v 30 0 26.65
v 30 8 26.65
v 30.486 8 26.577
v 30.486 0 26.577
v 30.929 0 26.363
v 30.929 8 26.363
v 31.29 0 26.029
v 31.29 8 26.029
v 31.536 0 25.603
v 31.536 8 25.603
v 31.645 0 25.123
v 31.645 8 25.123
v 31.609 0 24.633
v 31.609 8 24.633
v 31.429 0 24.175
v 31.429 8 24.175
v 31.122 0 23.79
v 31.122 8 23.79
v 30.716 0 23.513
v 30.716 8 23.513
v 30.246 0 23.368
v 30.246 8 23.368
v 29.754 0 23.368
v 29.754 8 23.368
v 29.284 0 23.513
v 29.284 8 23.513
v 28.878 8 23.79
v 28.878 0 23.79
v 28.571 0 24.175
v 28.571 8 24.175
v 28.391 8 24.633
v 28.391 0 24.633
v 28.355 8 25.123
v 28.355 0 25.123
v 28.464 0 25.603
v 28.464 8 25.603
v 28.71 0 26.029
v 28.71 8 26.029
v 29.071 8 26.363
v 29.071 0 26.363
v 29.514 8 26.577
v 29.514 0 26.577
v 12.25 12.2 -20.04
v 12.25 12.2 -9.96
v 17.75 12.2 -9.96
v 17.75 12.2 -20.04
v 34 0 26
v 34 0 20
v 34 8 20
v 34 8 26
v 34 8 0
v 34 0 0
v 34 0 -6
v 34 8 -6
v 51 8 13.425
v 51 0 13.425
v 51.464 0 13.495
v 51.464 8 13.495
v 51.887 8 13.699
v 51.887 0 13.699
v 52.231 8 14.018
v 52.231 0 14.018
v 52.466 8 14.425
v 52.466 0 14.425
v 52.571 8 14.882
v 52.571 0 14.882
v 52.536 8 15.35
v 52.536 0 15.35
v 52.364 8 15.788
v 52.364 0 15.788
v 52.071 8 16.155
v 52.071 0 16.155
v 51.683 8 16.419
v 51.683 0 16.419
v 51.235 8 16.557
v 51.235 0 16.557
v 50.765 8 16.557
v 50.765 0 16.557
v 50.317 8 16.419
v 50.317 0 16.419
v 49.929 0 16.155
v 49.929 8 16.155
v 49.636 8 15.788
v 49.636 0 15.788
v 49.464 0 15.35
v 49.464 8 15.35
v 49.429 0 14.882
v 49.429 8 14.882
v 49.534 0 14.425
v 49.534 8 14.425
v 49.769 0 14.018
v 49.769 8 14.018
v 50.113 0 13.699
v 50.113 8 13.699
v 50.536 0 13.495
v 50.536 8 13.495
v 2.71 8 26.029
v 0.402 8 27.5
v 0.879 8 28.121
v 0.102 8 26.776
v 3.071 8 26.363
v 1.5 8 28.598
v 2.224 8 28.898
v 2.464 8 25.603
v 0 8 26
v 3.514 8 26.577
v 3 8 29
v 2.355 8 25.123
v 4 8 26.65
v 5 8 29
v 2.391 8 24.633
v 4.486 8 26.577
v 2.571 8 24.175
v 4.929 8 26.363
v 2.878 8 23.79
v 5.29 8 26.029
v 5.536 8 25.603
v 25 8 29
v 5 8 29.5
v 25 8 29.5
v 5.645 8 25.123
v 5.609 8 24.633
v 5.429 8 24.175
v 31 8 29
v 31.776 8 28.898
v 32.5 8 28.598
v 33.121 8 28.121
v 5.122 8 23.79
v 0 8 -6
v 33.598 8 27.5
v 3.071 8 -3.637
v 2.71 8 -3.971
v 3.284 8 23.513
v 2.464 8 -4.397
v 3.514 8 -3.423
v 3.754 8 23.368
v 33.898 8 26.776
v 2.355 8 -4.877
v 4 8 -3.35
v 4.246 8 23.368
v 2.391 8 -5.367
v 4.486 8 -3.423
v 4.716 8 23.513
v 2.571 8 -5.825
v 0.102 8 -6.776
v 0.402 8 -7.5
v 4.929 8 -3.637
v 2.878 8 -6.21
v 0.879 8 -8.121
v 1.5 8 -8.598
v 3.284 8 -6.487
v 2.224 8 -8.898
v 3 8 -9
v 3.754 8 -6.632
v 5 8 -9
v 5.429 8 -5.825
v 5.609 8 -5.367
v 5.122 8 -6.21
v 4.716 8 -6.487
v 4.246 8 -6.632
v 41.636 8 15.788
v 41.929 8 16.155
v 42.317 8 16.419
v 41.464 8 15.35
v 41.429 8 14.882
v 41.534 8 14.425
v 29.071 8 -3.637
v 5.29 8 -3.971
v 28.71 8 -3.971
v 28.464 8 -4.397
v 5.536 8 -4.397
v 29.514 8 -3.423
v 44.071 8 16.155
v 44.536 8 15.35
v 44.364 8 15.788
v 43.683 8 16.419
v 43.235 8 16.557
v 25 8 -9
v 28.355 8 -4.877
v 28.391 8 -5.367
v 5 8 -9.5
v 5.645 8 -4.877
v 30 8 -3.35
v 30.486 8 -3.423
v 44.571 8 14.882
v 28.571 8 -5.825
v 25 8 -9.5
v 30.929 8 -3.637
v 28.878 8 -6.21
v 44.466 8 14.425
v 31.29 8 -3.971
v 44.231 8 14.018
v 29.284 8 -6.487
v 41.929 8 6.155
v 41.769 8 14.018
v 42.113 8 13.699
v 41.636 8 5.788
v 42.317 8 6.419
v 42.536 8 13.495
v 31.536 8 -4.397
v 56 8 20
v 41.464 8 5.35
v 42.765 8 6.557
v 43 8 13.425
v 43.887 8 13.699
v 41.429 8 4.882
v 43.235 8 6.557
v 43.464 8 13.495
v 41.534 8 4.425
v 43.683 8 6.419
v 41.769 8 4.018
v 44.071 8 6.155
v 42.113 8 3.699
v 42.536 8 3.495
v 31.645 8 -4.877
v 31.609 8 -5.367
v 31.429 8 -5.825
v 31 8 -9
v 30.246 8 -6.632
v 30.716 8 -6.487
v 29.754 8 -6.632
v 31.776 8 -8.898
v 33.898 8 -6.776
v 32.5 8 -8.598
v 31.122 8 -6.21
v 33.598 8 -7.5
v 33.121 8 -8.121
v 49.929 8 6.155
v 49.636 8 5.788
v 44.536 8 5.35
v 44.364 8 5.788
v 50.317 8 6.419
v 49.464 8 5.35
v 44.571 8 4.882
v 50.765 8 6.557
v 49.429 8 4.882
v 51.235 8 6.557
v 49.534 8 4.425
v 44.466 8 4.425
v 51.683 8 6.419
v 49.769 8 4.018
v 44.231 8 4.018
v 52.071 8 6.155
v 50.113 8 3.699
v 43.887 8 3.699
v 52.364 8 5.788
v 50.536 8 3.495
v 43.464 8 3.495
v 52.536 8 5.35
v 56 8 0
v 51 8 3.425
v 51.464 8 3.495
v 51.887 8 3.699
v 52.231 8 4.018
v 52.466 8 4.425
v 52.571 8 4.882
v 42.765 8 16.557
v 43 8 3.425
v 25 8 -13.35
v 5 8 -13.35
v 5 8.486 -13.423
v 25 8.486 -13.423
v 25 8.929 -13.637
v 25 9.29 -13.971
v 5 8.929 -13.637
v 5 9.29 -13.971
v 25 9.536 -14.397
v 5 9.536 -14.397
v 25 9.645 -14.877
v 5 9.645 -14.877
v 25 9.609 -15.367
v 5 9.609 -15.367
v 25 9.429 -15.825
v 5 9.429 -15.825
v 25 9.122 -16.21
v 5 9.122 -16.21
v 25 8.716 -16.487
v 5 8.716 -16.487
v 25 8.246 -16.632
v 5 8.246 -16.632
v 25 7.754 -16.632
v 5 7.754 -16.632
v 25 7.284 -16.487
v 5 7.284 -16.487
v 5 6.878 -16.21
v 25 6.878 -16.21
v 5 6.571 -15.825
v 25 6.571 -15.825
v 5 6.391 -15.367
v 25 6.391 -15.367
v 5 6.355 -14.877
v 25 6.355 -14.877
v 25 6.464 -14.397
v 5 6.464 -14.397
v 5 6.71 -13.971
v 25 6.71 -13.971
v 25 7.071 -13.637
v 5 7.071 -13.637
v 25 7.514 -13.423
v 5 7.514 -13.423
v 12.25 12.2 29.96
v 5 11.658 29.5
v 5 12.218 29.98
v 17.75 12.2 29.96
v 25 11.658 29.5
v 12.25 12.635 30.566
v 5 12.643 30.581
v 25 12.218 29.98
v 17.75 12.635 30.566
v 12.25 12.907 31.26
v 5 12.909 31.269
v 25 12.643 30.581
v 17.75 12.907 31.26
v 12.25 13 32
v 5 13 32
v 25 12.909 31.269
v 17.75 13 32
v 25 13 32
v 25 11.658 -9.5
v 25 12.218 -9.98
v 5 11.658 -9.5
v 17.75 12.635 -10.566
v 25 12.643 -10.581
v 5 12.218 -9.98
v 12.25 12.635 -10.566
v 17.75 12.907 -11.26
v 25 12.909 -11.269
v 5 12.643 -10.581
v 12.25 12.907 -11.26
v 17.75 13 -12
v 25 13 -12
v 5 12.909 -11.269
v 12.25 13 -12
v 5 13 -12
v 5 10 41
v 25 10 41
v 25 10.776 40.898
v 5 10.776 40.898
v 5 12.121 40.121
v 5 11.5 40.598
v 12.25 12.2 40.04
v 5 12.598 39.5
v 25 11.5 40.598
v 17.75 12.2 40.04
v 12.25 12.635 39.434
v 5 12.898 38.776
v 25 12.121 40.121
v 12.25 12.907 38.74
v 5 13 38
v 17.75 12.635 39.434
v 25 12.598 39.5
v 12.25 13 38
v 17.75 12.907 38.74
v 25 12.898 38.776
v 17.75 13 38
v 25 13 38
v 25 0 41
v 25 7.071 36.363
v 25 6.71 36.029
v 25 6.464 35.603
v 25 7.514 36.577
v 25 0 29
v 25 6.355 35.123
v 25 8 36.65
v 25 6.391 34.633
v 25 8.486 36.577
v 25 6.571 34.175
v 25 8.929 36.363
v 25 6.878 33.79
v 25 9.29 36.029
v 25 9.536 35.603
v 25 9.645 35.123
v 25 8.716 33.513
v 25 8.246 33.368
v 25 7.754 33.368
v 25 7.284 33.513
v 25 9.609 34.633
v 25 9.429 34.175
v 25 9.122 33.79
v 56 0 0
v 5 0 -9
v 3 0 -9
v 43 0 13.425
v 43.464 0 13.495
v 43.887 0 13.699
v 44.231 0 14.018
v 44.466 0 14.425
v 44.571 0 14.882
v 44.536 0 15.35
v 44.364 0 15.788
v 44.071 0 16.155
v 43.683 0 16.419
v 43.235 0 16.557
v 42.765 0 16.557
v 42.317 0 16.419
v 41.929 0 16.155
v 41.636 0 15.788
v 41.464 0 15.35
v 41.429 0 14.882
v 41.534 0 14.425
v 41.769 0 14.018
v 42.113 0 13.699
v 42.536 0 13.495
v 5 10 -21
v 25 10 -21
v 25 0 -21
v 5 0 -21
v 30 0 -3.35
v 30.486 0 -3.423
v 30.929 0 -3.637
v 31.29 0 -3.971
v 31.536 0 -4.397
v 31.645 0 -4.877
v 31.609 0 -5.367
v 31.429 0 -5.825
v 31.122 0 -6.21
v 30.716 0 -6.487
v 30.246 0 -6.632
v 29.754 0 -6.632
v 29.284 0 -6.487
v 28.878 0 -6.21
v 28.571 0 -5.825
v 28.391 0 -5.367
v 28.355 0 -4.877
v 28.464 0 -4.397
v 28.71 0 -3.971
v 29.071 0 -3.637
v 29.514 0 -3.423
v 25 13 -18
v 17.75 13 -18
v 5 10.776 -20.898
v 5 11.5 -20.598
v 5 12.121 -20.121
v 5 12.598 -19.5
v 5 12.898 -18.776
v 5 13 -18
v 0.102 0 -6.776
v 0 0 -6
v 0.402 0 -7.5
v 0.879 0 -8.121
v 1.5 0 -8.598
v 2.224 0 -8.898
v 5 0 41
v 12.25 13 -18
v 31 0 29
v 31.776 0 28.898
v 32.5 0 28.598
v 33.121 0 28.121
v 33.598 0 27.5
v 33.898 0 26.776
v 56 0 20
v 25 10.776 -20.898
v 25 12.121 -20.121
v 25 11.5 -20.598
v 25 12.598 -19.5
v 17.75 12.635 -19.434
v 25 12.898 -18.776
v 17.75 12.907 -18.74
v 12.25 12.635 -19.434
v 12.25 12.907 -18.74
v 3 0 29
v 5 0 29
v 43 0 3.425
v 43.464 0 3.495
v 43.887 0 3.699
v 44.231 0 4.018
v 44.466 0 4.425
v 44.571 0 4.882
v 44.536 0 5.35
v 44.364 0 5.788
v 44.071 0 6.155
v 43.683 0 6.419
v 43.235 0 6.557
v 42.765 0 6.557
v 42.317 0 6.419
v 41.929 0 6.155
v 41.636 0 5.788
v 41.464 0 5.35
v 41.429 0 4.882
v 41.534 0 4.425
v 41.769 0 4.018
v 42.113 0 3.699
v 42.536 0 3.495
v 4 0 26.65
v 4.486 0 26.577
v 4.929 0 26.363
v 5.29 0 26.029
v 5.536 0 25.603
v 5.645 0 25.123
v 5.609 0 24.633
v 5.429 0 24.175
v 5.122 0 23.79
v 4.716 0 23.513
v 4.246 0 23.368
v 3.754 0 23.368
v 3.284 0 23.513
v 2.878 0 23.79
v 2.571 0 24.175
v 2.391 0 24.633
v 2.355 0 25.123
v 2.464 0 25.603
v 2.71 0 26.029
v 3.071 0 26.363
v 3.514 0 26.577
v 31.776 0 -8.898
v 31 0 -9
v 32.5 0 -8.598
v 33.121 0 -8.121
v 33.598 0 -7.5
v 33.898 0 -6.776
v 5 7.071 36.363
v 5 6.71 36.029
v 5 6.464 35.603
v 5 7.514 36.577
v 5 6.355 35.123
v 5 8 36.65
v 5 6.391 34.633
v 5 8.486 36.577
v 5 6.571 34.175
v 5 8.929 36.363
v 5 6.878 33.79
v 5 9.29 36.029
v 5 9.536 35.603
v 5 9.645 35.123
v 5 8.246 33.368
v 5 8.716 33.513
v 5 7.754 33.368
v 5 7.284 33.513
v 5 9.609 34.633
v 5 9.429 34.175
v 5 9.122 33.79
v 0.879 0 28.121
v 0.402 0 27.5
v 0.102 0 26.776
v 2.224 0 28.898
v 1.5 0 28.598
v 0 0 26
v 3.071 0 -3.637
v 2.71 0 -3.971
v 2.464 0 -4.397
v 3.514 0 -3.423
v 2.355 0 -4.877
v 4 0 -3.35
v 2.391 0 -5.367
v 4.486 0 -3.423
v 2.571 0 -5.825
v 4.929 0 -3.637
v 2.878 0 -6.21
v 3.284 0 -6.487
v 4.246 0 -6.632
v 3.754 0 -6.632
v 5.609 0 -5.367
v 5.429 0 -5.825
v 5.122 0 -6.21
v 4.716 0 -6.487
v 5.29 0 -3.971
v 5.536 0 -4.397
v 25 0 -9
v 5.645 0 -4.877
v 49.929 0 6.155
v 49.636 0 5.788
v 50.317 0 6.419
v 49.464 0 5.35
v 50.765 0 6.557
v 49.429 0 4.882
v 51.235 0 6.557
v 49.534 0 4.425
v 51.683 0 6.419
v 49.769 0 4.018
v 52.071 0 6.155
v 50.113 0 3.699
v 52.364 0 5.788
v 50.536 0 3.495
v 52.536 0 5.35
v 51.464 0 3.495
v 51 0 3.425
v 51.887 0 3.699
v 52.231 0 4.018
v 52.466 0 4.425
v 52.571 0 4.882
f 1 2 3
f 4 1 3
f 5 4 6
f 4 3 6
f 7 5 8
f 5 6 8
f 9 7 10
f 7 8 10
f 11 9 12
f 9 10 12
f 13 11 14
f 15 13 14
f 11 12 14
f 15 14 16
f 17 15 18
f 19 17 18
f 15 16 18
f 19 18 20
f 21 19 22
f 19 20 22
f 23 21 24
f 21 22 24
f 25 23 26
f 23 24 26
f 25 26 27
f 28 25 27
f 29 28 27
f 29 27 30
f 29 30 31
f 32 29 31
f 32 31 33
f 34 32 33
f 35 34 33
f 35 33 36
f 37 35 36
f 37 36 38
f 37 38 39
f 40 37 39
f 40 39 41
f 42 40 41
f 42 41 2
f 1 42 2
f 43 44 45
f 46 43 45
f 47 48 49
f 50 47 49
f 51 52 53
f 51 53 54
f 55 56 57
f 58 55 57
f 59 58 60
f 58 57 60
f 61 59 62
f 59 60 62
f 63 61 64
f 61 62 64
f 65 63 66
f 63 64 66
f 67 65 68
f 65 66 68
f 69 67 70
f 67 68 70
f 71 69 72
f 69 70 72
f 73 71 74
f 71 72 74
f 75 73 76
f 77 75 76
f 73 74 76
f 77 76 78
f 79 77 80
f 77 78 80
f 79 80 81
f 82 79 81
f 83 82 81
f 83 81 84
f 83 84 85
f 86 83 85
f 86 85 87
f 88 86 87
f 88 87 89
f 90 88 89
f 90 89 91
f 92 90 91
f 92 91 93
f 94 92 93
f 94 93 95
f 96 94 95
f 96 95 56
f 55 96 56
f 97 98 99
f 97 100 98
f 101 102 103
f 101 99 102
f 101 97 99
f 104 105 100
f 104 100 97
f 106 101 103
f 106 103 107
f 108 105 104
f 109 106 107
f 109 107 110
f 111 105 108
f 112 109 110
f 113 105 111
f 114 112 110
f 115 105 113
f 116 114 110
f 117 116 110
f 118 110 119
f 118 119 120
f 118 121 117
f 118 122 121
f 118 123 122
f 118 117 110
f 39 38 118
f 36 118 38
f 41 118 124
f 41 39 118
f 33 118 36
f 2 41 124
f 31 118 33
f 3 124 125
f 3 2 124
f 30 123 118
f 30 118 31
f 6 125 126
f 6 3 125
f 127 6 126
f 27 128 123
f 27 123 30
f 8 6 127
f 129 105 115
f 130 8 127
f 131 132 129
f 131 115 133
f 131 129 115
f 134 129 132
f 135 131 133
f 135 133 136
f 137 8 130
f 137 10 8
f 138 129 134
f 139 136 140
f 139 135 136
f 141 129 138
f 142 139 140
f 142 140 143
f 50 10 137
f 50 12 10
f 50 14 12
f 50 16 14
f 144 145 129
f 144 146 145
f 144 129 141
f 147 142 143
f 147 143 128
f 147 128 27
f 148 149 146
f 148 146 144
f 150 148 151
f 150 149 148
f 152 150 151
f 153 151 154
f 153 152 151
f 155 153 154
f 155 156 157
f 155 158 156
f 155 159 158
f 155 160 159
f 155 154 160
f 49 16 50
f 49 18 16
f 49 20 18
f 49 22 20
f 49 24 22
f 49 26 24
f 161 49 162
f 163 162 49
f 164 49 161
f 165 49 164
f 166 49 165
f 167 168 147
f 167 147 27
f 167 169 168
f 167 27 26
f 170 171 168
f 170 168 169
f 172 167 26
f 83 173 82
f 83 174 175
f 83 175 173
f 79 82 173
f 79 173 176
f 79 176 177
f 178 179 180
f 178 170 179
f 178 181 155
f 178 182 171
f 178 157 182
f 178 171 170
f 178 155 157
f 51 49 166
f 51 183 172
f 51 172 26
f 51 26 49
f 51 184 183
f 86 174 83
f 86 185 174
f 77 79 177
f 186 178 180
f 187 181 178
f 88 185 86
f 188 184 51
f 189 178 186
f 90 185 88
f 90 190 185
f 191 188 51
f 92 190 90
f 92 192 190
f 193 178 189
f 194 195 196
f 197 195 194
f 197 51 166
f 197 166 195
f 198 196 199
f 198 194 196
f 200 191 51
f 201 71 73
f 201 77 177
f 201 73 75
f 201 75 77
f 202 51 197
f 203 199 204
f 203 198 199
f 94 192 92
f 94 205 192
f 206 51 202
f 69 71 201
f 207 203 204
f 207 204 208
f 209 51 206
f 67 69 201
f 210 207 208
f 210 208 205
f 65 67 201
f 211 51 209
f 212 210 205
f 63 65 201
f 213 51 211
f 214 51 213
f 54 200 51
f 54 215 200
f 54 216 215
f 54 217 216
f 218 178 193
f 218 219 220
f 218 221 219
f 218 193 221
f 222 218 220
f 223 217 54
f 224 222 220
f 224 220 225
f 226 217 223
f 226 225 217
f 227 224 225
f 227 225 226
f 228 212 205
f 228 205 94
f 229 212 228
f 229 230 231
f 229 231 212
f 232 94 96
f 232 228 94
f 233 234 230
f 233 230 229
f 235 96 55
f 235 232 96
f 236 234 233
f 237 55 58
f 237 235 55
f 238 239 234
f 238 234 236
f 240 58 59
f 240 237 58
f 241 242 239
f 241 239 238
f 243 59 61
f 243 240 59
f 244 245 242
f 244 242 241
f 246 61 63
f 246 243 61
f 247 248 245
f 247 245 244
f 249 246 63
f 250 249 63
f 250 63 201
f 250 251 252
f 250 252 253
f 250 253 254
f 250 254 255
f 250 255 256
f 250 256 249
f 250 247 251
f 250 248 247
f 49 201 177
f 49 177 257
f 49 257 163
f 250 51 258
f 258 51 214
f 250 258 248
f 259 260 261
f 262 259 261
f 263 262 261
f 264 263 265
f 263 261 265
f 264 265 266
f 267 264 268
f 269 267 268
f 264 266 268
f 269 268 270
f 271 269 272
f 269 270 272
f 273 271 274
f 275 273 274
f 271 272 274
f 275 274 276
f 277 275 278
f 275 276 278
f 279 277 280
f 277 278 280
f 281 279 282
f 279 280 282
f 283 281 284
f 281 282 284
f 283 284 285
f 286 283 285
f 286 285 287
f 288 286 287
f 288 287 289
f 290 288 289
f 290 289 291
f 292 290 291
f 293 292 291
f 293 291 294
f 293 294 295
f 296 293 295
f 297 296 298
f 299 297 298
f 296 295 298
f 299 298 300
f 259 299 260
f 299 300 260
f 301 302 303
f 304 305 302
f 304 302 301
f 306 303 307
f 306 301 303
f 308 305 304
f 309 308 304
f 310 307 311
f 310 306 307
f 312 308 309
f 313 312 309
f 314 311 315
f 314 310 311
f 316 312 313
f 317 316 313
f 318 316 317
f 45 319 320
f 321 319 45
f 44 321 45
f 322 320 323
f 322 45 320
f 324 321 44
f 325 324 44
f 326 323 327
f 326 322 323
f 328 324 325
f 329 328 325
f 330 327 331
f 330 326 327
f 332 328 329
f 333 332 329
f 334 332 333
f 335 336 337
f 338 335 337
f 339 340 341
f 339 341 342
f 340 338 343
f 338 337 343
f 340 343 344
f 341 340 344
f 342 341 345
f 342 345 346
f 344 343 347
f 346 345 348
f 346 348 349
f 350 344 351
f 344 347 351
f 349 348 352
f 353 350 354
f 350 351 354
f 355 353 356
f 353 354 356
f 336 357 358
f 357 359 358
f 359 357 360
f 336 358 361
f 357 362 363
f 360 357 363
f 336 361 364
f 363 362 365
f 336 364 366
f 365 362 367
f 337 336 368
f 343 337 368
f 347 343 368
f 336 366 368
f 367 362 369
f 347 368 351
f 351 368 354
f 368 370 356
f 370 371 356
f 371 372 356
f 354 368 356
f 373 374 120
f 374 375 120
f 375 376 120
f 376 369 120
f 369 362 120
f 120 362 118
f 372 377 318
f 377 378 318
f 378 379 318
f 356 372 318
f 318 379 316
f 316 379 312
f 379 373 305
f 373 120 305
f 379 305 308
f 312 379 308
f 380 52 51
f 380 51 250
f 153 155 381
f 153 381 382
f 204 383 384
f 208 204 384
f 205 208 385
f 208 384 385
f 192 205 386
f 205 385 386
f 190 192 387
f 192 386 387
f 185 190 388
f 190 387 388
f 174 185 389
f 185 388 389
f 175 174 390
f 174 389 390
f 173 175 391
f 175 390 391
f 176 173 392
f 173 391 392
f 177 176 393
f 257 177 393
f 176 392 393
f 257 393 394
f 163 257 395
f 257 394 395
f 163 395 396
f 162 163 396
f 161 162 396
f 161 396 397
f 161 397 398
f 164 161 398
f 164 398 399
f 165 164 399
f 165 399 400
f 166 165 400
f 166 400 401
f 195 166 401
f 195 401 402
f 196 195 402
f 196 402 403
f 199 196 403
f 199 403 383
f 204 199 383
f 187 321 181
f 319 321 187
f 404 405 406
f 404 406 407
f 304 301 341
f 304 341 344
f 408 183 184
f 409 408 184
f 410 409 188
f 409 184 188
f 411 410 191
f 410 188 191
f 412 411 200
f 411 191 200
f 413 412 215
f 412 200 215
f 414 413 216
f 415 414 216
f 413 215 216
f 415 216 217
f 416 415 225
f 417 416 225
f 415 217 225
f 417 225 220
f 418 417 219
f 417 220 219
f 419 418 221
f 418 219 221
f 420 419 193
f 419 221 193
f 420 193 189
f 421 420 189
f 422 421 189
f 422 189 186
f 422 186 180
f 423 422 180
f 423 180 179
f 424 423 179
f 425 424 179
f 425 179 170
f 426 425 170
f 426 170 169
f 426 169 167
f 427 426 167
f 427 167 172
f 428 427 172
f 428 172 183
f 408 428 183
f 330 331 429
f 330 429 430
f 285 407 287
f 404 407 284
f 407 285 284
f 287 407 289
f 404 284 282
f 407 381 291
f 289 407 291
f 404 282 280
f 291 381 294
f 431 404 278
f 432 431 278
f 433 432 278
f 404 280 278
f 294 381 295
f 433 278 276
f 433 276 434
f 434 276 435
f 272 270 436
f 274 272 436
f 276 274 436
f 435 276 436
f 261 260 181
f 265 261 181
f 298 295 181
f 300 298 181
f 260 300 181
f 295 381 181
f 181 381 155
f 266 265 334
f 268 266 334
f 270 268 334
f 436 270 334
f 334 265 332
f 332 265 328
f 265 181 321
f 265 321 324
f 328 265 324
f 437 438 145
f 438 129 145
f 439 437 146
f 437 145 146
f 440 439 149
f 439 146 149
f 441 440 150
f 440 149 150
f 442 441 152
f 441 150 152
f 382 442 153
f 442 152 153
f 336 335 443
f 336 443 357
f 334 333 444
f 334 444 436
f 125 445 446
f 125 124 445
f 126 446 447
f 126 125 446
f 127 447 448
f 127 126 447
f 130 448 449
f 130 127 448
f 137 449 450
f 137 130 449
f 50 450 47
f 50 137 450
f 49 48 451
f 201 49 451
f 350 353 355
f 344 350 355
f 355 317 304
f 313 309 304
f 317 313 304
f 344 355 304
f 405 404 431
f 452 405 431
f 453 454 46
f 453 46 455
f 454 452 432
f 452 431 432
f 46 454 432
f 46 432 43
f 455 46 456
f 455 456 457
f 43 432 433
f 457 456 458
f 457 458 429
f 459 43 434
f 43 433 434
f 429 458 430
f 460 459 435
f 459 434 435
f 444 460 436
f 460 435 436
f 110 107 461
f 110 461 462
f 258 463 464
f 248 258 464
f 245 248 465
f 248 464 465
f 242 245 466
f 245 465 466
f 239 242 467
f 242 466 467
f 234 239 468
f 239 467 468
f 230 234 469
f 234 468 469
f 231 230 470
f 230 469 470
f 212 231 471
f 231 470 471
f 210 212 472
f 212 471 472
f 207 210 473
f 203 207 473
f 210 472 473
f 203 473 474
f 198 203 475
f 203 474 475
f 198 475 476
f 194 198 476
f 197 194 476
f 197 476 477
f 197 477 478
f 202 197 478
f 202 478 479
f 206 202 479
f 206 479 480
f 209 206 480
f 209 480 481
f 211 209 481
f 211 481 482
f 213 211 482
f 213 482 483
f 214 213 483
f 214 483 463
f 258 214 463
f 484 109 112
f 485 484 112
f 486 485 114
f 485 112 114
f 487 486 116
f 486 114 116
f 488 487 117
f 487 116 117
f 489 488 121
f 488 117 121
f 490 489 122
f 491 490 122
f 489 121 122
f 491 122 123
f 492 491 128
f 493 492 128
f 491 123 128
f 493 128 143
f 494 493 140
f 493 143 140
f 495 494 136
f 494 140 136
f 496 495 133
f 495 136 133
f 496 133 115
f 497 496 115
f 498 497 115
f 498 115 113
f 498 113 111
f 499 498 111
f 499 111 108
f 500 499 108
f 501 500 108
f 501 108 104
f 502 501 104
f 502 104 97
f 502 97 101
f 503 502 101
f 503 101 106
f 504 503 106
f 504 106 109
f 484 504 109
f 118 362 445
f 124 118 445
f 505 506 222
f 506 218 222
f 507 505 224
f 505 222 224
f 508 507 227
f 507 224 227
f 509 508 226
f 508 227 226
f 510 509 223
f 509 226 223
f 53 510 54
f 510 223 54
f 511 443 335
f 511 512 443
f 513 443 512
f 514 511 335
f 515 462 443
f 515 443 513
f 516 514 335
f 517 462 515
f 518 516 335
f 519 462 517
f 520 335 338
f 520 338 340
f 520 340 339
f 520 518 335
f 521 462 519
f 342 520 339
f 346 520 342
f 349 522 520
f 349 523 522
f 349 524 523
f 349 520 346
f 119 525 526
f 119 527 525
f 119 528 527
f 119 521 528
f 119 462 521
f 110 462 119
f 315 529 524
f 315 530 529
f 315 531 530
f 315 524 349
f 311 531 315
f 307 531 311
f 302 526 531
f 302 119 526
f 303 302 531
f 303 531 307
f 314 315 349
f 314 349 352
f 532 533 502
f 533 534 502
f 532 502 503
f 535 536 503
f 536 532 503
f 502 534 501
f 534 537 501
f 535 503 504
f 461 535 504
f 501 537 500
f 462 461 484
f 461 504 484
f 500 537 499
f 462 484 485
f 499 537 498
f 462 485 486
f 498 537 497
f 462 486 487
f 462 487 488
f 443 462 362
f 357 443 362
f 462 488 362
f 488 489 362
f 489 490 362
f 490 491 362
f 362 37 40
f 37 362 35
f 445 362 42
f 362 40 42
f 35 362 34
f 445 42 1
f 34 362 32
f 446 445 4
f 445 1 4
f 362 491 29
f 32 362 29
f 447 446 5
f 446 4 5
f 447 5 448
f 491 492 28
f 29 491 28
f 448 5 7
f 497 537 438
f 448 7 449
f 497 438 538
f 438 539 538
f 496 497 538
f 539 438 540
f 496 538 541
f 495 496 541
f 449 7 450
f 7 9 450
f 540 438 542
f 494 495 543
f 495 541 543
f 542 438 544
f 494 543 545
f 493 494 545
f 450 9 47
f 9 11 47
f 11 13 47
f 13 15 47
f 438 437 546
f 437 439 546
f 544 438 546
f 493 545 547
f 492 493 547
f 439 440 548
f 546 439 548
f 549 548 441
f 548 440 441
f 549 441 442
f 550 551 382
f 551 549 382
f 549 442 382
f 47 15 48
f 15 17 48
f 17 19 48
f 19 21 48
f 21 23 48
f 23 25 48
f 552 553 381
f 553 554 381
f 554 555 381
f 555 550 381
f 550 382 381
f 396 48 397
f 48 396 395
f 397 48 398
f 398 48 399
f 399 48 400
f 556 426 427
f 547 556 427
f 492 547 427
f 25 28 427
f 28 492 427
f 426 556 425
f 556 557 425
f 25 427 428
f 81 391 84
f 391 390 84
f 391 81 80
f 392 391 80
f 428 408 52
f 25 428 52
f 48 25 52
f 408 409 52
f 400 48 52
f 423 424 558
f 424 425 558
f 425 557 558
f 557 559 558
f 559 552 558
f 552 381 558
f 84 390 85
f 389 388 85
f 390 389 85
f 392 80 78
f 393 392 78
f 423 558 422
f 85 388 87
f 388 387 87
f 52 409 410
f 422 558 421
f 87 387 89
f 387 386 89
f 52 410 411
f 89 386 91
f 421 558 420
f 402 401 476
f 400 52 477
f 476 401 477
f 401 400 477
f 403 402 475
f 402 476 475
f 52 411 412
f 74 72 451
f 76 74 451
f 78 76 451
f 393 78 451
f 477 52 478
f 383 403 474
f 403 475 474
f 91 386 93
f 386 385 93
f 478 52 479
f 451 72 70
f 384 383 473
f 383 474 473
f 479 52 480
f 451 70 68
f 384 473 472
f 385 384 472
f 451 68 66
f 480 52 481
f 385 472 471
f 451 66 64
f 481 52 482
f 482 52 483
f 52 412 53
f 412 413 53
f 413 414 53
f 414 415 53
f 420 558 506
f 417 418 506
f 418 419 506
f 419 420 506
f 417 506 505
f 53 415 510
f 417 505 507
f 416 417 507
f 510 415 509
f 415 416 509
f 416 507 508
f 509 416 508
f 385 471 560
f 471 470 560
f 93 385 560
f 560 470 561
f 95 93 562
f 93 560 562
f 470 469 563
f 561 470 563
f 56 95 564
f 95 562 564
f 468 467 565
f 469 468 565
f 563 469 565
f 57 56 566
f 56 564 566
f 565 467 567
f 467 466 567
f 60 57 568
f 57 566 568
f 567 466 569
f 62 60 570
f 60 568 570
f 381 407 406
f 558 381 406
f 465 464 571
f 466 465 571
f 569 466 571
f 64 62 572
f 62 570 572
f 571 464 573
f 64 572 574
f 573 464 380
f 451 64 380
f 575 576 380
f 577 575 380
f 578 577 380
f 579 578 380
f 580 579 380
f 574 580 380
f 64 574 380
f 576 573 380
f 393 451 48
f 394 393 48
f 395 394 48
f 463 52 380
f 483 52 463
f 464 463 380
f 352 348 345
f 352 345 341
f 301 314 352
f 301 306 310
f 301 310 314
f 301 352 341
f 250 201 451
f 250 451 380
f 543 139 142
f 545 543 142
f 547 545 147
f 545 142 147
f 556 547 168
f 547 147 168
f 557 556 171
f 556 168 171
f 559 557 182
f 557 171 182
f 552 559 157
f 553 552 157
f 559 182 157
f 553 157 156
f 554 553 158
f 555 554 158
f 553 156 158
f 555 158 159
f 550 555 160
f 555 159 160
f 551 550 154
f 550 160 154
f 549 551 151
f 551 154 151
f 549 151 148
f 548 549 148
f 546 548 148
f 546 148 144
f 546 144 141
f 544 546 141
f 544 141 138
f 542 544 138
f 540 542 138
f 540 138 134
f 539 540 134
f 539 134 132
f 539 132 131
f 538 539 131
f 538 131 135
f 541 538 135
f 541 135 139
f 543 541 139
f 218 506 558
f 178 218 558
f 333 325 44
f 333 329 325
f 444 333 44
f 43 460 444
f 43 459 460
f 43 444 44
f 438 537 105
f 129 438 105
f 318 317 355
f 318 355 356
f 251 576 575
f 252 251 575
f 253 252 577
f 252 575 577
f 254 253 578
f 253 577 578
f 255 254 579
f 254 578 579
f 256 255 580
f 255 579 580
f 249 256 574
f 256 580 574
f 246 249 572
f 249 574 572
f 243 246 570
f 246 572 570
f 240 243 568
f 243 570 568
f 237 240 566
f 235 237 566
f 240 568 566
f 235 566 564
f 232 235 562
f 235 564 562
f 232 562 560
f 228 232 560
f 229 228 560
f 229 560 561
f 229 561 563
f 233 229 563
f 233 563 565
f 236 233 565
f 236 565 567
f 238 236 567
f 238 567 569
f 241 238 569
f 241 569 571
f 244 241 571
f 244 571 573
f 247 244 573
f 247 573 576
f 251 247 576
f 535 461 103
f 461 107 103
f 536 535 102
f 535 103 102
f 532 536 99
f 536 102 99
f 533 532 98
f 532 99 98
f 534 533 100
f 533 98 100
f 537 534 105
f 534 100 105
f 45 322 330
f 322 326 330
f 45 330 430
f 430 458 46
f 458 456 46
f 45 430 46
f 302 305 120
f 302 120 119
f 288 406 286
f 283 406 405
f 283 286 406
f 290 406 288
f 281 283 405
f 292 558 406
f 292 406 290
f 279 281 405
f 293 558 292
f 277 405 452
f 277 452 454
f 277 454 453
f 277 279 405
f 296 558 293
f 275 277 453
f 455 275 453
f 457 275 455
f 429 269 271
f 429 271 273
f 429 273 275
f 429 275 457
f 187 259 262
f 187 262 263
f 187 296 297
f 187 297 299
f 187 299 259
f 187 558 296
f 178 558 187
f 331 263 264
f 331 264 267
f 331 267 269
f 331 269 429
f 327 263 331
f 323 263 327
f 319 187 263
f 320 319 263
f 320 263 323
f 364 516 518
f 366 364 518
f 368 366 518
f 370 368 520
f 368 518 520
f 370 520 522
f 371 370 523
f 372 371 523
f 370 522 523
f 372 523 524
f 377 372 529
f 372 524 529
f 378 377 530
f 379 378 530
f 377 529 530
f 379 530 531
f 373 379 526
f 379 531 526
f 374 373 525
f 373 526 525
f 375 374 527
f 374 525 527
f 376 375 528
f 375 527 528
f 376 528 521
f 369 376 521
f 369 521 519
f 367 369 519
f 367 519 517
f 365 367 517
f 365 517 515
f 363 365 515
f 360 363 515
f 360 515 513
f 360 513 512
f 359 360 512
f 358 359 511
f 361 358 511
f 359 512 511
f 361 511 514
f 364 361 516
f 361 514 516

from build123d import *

# Parameters (mm, degrees)
SKETCH1_W            = 300
SKETCH1_H            = 20
BOSS_EXTRUDE1_DEPTH  = 8
SKETCH2_W            = 34
SKETCH2_H            = 8
BOSS_EXTRUDE2_DEPTH  = 9
SKETCH3_W            = 34
SKETCH3_H            = 8
BOSS_EXTRUDE3_DEPTH  = 9
SKETCH4_R            = 1.65
CUT_EXTRUDE1_DEPTH   = 302.504560496
SKETCH5_W            = 25
SKETCH5_H            = 8
BOSS_EXTRUDE4_DEPTH  = 17
SKETCH6_W            = 25
SKETCH6_H            = 8
BOSS_EXTRUDE5_DEPTH  = 17
SKETCH7_W            = 10
SKETCH7_H            = 38
CUT_EXTRUDE2_DEPTH   = 303.37890138
SKETCH8_W            = 7
SKETCH8_H            = 16
CUT_EXTRUDE3_DEPTH   = 4
CUT_EXTRUDE4_DEPTH   = 7
BOSS_EXTRUDE6_DEPTH  = 10
SKETCH12_W           = 8
SKETCH12_H           = 8
BOSS_EXTRUDE7_DEPTH  = 17
SKETCH13_R           = 1.7
CUT_EXTRUDE6_DEPTH   = 305.926220585
SKETCH14_W           = 20
SKETCH14_H           = 13
BOSS_EXTRUDE8_DEPTH  = 12
SKETCH15_R           = 1.6
CUT_EXTRUDE7_DEPTH   = 20
SKETCH16_W           = 20
SKETCH16_H           = 13
BOSS_EXTRUDE9_DEPTH  = 12
SKETCH17_R           = 1.6
CUT_EXTRUDE8_DEPTH   = 20
SKETCH18_W           = 20
SKETCH18_H           = 13
BOSS_EXTRUDE10_DEPTH = 12
SKETCH19_R           = 1.65
CUT_EXTRUDE9_DEPTH   = 20
SKETCH20_W           = 20
SKETCH20_H           = 13
BOSS_EXTRUDE11_DEPTH = 12
SKETCH21_R           = 1.65
CUT_EXTRUDE10_DEPTH  = 20
FILLET6_R            = 3
SKETCH22_W           = 123.750788161
SKETCH22_H           = 72.639217631
CUT_EXTRUDE11_DEPTH  = 244
SKETCH23_R           = 1.575
CUT_EXTRUDE12_DEPTH  = 71.611613776
FILLET7_R            = 3
SKETCH24_W           = 5.5
SKETCH24_H           = 78.243551934
CUT_EXTRUDE13_DEPTH  = 0.8
SKETCH25_W           = 20
SKETCH25_H           = 5.75655834
CUT_EXTRUDE14_DEPTH  = 0.5
SKETCH26_W           = 20
SKETCH26_H           = 21.459079842
CUT_EXTRUDE15_DEPTH  = 0.5


with BuildPart() as part:
    # Sketch1 → Boss-Extrude1 (new body)
    with BuildSketch(Plane(origin=(0, 0, 0), x_dir=(1, 0, 0), z_dir=(0, 1, 0))):
        with Locations((150, -10)):
            Rectangle(SKETCH1_W, SKETCH1_H)
    extrude(amount=BOSS_EXTRUDE1_DEPTH)

    # Sketch2 → Boss-Extrude2 (add)
    with BuildSketch(Plane.XY.offset(20)):
        with Locations((17, 4)):
            Rectangle(SKETCH2_W, SKETCH2_H)
        with Locations((283, 4)):
            Rectangle(SKETCH2_W, SKETCH2_H)
    extrude(amount=BOSS_EXTRUDE2_DEPTH)

    # Sketch3 → Boss-Extrude3 (add)
    with BuildSketch(Plane(origin=(0, 0, 0), x_dir=(-1, 0, 0), z_dir=(0, 0, -1))):
        with Locations((-17, 4)):
            Rectangle(SKETCH3_W, SKETCH3_H)
        with Locations((-283, 4)):
            Rectangle(SKETCH3_W, SKETCH3_H)
    extrude(amount=BOSS_EXTRUDE3_DEPTH)

    # Sketch4 → Cut-Extrude1 (cut, through all)
    with BuildSketch(Plane(origin=(0, 8, 0), x_dir=(1, 0, 0), z_dir=(0, 1, 0))):
        with Locations(Location((4, 5, 0), (0, 0, 270))):
            Circle(SKETCH4_R)
        with Locations(Location((30, 5, 0), (0, 0, 270))):
            Circle(SKETCH4_R)
        with Locations(Location((30, -25, 0), (0, 0, 270))):
            Circle(SKETCH4_R)
        with Locations(Location((4, -25, 0), (0, 0, 270))):
            Circle(SKETCH4_R)
        with Locations(Location((296, -25, 0), (0, 0, 270))):
            Circle(SKETCH4_R)
        with Locations(Location((296, 5, 0), (0, 0, 270))):
            Circle(SKETCH4_R)
        with Locations(Location((270, -25, 0), (0, 0, 270))):
            Circle(SKETCH4_R)
        with Locations(Location((270, 5, 0), (0, 0, 270))):
            Circle(SKETCH4_R)
    extrude(amount=-CUT_EXTRUDE1_DEPTH, mode=Mode.SUBTRACT)

    # Sketch5 → Boss-Extrude4 (add)
    with BuildSketch(Plane.XY.offset(20)):
        with Locations((253.5, 4)):
            Rectangle(SKETCH5_W, SKETCH5_H)
    extrude(amount=BOSS_EXTRUDE4_DEPTH)

    # Sketch6 → Boss-Extrude5 (add)
    with BuildSketch(Plane(origin=(0, 0, 0), x_dir=(-1, 0, 0), z_dir=(0, 0, -1))):
        with Locations((-253.5, 4)):
            Rectangle(SKETCH6_W, SKETCH6_H)
    extrude(amount=BOSS_EXTRUDE5_DEPTH)

    # Sketch7 → Cut-Extrude2 (cut, through all)
    with BuildSketch(Plane(origin=(0, 8, 0), x_dir=(1, 0, 0), z_dir=(0, 1, 0))):
        with Locations((254, -10)):
            Rectangle(SKETCH7_W, SKETCH7_H)
    extrude(amount=-CUT_EXTRUDE2_DEPTH, mode=Mode.SUBTRACT)

    # Sketch8 → Cut-Extrude3 (cut)
    with BuildSketch(Plane(origin=(0, 8, 0), x_dir=(1, 0, 0), z_dir=(0, 1, 0))):
        with Locations((262.5, -10)):
            Rectangle(SKETCH8_W, SKETCH8_H)
    extrude(amount=-CUT_EXTRUDE3_DEPTH, mode=Mode.SUBTRACT)

    # Sketch9 → Cut-Extrude4 (cut)
    with BuildSketch(Plane.ZY.offset(-259)):
        Polygon((18, 4), (22, 8), (18, 8), align=None)
        Polygon((2, 4), (-2, 8), (2, 8), align=None)
    extrude(amount=-CUT_EXTRUDE4_DEPTH, mode=Mode.SUBTRACT)

    # Sketch10 → Boss-Extrude6 (add)
    with BuildSketch(Plane.ZY.offset(-259)):
        Polygon((-2, 0), (-9, 8), (-9, 0), align=None)
        Polygon((29, 8), (22, 0), (29, 0), align=None)
    extrude(amount=BOSS_EXTRUDE6_DEPTH)

    # Sketch12 → Boss-Extrude7 (add)
    with BuildSketch(Plane.XY.offset(37)):
        with Locations((245, 4)):
            Rectangle(SKETCH12_W, SKETCH12_H)
    extrude(amount=BOSS_EXTRUDE7_DEPTH)

    # Sketch13 → Cut-Extrude6 (cut, through all)
    with BuildSketch(Plane(origin=(0, 8, 0), x_dir=(1, 0, 0), z_dir=(0, 1, 0))):
        with Locations(Location((245, -50, 0), (0, 0, 270))):
            Circle(SKETCH13_R)
        with Locations(Location((245, -18, 0), (0, 0, 270))):
            Circle(SKETCH13_R)
    extrude(amount=-CUT_EXTRUDE6_DEPTH, mode=Mode.SUBTRACT)

    # Sketch14 → Boss-Extrude8 (add)
    with BuildSketch(Plane.XY.offset(29)):
        with Locations((285, 6.5)):
            Rectangle(SKETCH14_W, SKETCH14_H)
    extrude(amount=BOSS_EXTRUDE8_DEPTH)

    # Sketch15 → Cut-Extrude7 (cut)
    with BuildSketch(Plane(origin=(295, 0, 0), x_dir=(0, 0, -1), z_dir=(1, 0, 0))):
        with Locations((-35, 8)):
            Circle(SKETCH15_R)
    extrude(amount=-CUT_EXTRUDE7_DEPTH, mode=Mode.SUBTRACT)

    # Sketch16 → Boss-Extrude9 (add)
    with BuildSketch(Plane(origin=(0, 0, -9), x_dir=(-1, 0, 0), z_dir=(0, 0, -1))):
        with Locations((-285, 6.5)):
            Rectangle(SKETCH16_W, SKETCH16_H)
    extrude(amount=BOSS_EXTRUDE9_DEPTH)

    # Sketch17 → Cut-Extrude8 (cut)
    with BuildSketch(Plane(origin=(295, 0, 0), x_dir=(0, 0, -1), z_dir=(1, 0, 0))):
        with Locations((15, 8)):
            Circle(SKETCH17_R)
    extrude(amount=-CUT_EXTRUDE8_DEPTH, mode=Mode.SUBTRACT)

    # Sketch18 → Boss-Extrude10 (add)
    with BuildSketch(Plane(origin=(0, 0, -9), x_dir=(-1, 0, 0), z_dir=(0, 0, -1))):
        with Locations((-15, 6.5)):
            Rectangle(SKETCH18_W, SKETCH18_H)
    extrude(amount=BOSS_EXTRUDE10_DEPTH)

    # Sketch19 → Cut-Extrude9 (cut)
    with BuildSketch(Plane.ZY.offset(-5)):
        with Locations((-15, 8)):
            Circle(SKETCH19_R)
    extrude(amount=-CUT_EXTRUDE9_DEPTH, mode=Mode.SUBTRACT)

    # Sketch20 → Boss-Extrude11 (add)
    with BuildSketch(Plane.XY.offset(29)):
        with Locations((15, 6.5)):
            Rectangle(SKETCH20_W, SKETCH20_H)
    extrude(amount=BOSS_EXTRUDE11_DEPTH)

    # Sketch21 → Cut-Extrude10 (cut)
    with BuildSketch(Plane.ZY.offset(-5)):
        with Locations((35, 8)):
            Circle(SKETCH21_R)
    extrude(amount=-CUT_EXTRUDE10_DEPTH, mode=Mode.SUBTRACT)

    # Fillet6
    fillet6_edges = [part.edges().sort_by_distance(p)[0] for p in [
        (285, 13, 29),
        (285, 13, 41),
        (285, 13, -9),
        (285, 13, -21),
        (15, 13, -9),
        (15, 13, -21),
        (15, 13, 29),
        (15, 13, 41),
    ]]
    fillet(fillet6_edges, radius=FILLET6_R)

    # Sketch22 → Cut-Extrude11 (cut)
    with BuildSketch(Plane(origin=(300, 0, 0), x_dir=(0, 0, -1), z_dir=(1, 0, 0))):
        with Locations((-10.128058827, -1.301866478)):
            Rectangle(SKETCH22_W, SKETCH22_H)
    extrude(amount=-CUT_EXTRUDE11_DEPTH, mode=Mode.SUBTRACT)

    # Sketch23 → Cut-Extrude12 (cut, through all)
    with BuildSketch(Plane(origin=(0, 0, 0), x_dir=(-1, 0, 0), z_dir=(0, -1, 0))):
        with Locations(Location((-51, -5, 0), (0, 0, 90))):
            Circle(SKETCH23_R)
        with Locations(Location((-51, -15, 0), (0, 0, 90))):
            Circle(SKETCH23_R)
        with Locations(Location((-43, -5, 0), (0, 0, 90))):
            Circle(SKETCH23_R)
        with Locations(Location((-43, -15, 0), (0, 0, 90))):
            Circle(SKETCH23_R)
    extrude(amount=-CUT_EXTRUDE12_DEPTH, mode=Mode.SUBTRACT)

    # Fillet7
    fillet7_edges = [part.edges().sort_by_distance(p)[0] for p in [
        (0, 4, 29),
        (34, 4, 29),
        (0, 4, -9),
        (34, 4, -9),
    ]]
    fillet(fillet7_edges, radius=FILLET7_R)

    # Sketch24 → Cut-Extrude13 (cut)
    with BuildSketch(Plane(origin=(0, 13, 0), x_dir=(1, 0, 0), z_dir=(0, 1, 0))):
        with Locations((15, -9.577024089)):
            Rectangle(SKETCH24_W, SKETCH24_H)
    extrude(amount=-CUT_EXTRUDE13_DEPTH, mode=Mode.SUBTRACT)

    # Sketch25 → Cut-Extrude14 (cut)
    with BuildSketch(Plane(origin=(0, 0, 29), x_dir=(-1, 0, 0), z_dir=(0, 0, -1))):
        with Locations((-15, 10.87827917)):
            Rectangle(SKETCH25_W, SKETCH25_H)
    extrude(amount=-CUT_EXTRUDE14_DEPTH, mode=Mode.SUBTRACT)

    # Sketch26 → Cut-Extrude15 (cut)
    with BuildSketch(Plane.XY.offset(-9)):
        with Locations((15, 18.729539921)):
            Rectangle(SKETCH26_W, SKETCH26_H)
    extrude(amount=-CUT_EXTRUDE15_DEPTH, mode=Mode.SUBTRACT)


solid = part.part
